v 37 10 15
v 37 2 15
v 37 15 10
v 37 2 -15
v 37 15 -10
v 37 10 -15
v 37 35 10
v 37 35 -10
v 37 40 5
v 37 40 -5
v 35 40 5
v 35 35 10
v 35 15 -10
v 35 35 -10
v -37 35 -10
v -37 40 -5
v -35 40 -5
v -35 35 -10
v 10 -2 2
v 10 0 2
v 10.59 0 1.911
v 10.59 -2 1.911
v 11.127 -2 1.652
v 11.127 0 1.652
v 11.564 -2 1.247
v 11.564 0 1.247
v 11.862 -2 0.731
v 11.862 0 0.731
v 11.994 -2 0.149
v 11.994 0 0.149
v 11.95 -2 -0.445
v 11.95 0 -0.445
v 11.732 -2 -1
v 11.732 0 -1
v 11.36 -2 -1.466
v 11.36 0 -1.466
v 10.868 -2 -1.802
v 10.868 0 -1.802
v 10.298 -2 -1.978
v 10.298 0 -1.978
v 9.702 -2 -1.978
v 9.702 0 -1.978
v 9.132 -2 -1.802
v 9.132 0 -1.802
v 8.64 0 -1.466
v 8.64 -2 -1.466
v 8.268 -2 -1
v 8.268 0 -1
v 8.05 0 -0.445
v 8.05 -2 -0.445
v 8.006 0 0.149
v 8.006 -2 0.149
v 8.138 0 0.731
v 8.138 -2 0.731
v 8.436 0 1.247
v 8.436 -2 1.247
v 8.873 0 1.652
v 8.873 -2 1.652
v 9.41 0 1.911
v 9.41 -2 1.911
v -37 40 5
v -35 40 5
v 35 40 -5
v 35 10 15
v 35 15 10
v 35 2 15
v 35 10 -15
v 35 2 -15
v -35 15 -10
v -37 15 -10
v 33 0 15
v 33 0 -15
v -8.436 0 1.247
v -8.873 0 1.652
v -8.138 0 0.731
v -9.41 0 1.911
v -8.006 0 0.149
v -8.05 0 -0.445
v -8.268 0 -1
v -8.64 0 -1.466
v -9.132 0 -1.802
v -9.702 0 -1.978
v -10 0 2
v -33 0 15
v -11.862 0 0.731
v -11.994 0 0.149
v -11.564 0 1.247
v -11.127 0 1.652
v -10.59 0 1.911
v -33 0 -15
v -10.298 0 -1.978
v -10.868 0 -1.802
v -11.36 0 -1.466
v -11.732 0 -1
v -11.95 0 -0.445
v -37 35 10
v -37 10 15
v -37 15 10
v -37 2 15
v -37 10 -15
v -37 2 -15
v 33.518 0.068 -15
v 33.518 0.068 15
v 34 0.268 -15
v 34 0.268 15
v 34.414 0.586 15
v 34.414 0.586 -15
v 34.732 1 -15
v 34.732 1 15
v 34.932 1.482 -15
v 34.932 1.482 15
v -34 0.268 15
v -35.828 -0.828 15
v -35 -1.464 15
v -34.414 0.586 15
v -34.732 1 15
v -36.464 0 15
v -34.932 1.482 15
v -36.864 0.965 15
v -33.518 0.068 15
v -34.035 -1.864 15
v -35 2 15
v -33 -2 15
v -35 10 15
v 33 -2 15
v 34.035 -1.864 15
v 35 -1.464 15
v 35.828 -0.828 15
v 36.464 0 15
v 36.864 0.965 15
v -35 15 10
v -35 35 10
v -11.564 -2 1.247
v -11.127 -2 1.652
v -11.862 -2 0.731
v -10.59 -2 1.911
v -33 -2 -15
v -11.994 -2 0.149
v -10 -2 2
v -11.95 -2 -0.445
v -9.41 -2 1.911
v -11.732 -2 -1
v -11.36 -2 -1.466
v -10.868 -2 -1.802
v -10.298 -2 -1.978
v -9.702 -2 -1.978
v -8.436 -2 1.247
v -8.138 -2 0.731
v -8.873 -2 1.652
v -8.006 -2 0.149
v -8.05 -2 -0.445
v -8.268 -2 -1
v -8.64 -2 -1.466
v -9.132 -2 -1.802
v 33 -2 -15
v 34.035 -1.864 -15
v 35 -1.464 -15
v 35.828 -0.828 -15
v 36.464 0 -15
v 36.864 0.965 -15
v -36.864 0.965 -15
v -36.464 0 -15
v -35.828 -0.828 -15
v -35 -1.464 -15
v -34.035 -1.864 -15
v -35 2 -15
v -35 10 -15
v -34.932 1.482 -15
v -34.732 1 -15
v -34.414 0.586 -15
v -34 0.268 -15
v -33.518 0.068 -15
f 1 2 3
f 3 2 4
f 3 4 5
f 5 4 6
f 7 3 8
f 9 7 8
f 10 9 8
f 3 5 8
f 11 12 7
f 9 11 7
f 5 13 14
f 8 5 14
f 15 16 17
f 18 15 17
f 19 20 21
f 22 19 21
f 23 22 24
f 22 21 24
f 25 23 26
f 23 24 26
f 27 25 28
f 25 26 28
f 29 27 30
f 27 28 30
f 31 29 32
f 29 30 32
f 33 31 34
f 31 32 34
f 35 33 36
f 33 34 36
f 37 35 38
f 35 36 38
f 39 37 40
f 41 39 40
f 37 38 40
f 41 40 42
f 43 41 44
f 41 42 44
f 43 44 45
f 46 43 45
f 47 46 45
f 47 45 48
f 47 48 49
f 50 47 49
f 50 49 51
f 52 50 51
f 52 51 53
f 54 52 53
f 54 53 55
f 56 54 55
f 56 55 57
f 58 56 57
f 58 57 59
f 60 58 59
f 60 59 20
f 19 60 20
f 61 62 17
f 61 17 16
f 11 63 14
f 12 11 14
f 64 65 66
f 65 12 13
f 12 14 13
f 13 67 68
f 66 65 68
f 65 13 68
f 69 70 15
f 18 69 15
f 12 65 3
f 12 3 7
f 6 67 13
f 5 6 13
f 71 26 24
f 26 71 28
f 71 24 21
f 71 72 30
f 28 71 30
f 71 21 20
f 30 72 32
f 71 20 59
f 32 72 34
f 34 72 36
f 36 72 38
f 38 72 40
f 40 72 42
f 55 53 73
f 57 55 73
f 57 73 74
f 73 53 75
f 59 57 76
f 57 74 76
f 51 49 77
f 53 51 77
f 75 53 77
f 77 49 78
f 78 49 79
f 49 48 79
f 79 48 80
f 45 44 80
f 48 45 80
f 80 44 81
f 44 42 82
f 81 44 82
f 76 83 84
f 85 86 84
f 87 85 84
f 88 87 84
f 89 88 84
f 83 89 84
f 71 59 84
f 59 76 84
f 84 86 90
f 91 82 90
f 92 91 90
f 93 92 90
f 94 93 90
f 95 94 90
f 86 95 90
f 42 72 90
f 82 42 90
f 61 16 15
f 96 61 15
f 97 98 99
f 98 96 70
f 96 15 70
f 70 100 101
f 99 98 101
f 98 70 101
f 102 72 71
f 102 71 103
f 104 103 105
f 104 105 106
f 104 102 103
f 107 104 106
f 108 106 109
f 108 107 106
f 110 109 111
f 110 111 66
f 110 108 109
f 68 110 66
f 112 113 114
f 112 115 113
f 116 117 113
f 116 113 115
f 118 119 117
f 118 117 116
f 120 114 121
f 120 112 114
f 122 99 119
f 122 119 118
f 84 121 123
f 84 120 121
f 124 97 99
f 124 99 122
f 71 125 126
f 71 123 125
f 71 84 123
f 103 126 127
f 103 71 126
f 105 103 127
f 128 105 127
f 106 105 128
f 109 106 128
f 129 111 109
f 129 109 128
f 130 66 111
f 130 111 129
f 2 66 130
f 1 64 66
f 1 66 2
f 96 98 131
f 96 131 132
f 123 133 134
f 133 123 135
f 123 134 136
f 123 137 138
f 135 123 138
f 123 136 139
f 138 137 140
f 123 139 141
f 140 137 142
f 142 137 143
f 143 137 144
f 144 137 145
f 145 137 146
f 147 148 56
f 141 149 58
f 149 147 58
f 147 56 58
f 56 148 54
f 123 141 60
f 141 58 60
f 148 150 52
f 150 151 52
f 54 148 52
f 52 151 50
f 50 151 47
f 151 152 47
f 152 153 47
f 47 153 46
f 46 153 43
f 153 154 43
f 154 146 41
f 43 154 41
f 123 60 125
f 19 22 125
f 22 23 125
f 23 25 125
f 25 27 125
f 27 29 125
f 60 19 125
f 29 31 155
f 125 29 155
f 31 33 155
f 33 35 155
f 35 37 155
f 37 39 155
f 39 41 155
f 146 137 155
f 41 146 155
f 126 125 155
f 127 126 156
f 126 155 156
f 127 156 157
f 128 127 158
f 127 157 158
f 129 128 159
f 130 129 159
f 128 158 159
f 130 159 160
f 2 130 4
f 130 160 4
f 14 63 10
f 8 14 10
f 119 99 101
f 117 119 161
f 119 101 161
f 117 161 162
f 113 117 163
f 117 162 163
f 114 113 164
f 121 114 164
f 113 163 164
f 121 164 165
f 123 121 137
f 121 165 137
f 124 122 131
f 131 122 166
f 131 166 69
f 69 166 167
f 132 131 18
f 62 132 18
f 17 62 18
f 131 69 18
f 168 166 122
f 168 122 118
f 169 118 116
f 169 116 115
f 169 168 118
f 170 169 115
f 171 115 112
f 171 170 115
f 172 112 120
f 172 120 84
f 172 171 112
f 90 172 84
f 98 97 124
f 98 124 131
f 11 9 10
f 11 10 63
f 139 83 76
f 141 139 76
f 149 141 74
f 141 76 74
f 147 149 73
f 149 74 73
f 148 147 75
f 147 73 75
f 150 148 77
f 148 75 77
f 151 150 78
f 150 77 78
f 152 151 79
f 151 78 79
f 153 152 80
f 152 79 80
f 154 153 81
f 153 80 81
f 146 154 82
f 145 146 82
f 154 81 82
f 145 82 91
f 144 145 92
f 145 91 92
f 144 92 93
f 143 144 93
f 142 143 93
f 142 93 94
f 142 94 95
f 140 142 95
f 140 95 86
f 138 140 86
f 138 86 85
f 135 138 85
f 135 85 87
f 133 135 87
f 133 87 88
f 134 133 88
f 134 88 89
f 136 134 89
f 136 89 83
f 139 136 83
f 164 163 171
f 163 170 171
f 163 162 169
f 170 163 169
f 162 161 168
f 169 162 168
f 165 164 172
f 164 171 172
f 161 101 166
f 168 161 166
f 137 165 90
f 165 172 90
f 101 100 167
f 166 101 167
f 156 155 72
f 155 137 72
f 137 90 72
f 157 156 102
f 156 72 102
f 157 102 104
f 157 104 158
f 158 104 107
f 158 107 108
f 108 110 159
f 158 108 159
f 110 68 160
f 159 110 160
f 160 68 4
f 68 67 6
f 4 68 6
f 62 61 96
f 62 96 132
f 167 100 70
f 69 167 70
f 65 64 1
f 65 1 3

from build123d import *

# Parameters (mm, degrees)
SKETCH_1_W               = 70
SKETCH_1_H               = 30
EXTRUDE_1_DEPTH          = 40
SHEET_START              = -15
SHEET_METAL_1_DEPTH      = 30
SHEET_METAL_1_2_DEPTH    = 30
CUT_EXTRUDE_1_REACH      = 58.515
SKETCH_6_R               = 2
CUT_EXTRUDE_3_DEPTH      = 57.515484604
CUT_EXTRUDE_3_DEPTH_BACK = 57.515484604
CHAMFER_1_SIZE           = 5


# Read off the part's stored shape, not the designer's step: 转换实体1
with BuildPart() as part:
    # Sketch 1 → 凸台-拉伸1 (new body)
    with BuildSketch(Plane(origin=(0, 0, 0), x_dir=(1, 0, 0), z_dir=(0, 1, 0))):
        Rectangle(SKETCH_1_W, SKETCH_1_H)
    extrude(amount=EXTRUDE_1_DEPTH)

    # Sheet Metal 1 outline → Sheet Metal 1 (cut)
    with BuildSketch(Plane.XY.offset(SHEET_START)):
        with BuildLine():
            Line((35, 2), (35, 40))
            Line((35, 40), (-35, 40))
            Line((-35, 40), (-35, 2))
            ThreePointArc((-35, 2), (-34.414213562, 0.585786438), (-33, 0))
            Line((-33, 0), (33, 0))
            ThreePointArc((33, 0), (34.414213562, 0.585786438), (35, 2))
        make_face()
    extrude(amount=SHEET_METAL_1_DEPTH, mode=Mode.SUBTRACT)

    # Sheet Metal 1 2 outline → Sheet Metal 1 2 (add)
    with BuildSketch(Plane.XY.offset(SHEET_START)):
        with BuildLine():
            Line((37, 2), (37, 40))
            Line((37, 40), (35, 40))
            Line((35, 40), (35, 0))
            Line((35, 0), (-35, 0))
            Line((-35, 0), (-35, 40))
            Line((-35, 40), (-37, 40))
            Line((-37, 40), (-37, 2))
            ThreePointArc((-37, 2), (-35.828427125, -0.828427125), (-33, -2))
            Line((-33, -2), (33, -2))
            ThreePointArc((33, -2), (35.828427125, -0.828427125), (37, 2))
        make_face()
    extrude(amount=SHEET_METAL_1_2_DEPTH)

    # 草图6 → 切除-拉伸1 (cut, up to next)
    with BuildSketch(Plane(origin=(0, 0, 0), x_dir=(1, 0, 0), z_dir=(0, 1, 0)), mode=Mode.PRIVATE) as cut_extrude_1_sk1:
        with Locations(Location((-10, 0, 0), (0, 0, 270))):
            Circle(SKETCH_6_R)
    cut_extrude_1_tool1 = extrude(cut_extrude_1_sk1.sketch, amount=-CUT_EXTRUDE_1_REACH, mode=Mode.PRIVATE) & part.part
    # 草图6 → 切除-拉伸1 (cut, up to next)
    with BuildSketch(Plane(origin=(0, 0, 0), x_dir=(1, 0, 0), z_dir=(0, 1, 0)), mode=Mode.PRIVATE) as cut_extrude_1_sk2:
        with Locations(Location((10, 0, 0), (0, 0, 270))):
            Circle(SKETCH_6_R)
    cut_extrude_1_tool2 = extrude(cut_extrude_1_sk2.sketch, amount=-CUT_EXTRUDE_1_REACH, mode=Mode.PRIVATE) & part.part
    add(cut_extrude_1_tool1.solids().sort_by_distance((-10, 0, 0))[0], mode=Mode.SUBTRACT)
    add(cut_extrude_1_tool2.solids().sort_by_distance((10, 0, 0))[0], mode=Mode.SUBTRACT)

    # 草图7 → 切除-拉伸3 (cut, two sides: drawn at the far end of the back side and taken through both)
    with BuildSketch(Plane(origin=(0, 0, 0), x_dir=(0, 0, -1), z_dir=(1, 0, 0)).offset(-CUT_EXTRUDE_3_DEPTH_BACK)):
        Polygon((-15, 10), (-10, 15), (-10, 40), (-15, 40), align=None)
        Polygon((10, 15), (10, 40), (15, 40), (15, 10), align=None)
    extrude(amount=CUT_EXTRUDE_3_DEPTH + CUT_EXTRUDE_3_DEPTH_BACK, mode=Mode.SUBTRACT)

    # 倒角1
    chamfer_1_edges = [part.edges().sort_by_distance(p)[0] for p in [
        (-36, 40, 10),
        (36, 40, 10),
        (-36, 40, -10),
        (36, 40, -10),
    ]]
    chamfer(chamfer_1_edges, length=CHAMFER_1_SIZE)


solid = part.part
